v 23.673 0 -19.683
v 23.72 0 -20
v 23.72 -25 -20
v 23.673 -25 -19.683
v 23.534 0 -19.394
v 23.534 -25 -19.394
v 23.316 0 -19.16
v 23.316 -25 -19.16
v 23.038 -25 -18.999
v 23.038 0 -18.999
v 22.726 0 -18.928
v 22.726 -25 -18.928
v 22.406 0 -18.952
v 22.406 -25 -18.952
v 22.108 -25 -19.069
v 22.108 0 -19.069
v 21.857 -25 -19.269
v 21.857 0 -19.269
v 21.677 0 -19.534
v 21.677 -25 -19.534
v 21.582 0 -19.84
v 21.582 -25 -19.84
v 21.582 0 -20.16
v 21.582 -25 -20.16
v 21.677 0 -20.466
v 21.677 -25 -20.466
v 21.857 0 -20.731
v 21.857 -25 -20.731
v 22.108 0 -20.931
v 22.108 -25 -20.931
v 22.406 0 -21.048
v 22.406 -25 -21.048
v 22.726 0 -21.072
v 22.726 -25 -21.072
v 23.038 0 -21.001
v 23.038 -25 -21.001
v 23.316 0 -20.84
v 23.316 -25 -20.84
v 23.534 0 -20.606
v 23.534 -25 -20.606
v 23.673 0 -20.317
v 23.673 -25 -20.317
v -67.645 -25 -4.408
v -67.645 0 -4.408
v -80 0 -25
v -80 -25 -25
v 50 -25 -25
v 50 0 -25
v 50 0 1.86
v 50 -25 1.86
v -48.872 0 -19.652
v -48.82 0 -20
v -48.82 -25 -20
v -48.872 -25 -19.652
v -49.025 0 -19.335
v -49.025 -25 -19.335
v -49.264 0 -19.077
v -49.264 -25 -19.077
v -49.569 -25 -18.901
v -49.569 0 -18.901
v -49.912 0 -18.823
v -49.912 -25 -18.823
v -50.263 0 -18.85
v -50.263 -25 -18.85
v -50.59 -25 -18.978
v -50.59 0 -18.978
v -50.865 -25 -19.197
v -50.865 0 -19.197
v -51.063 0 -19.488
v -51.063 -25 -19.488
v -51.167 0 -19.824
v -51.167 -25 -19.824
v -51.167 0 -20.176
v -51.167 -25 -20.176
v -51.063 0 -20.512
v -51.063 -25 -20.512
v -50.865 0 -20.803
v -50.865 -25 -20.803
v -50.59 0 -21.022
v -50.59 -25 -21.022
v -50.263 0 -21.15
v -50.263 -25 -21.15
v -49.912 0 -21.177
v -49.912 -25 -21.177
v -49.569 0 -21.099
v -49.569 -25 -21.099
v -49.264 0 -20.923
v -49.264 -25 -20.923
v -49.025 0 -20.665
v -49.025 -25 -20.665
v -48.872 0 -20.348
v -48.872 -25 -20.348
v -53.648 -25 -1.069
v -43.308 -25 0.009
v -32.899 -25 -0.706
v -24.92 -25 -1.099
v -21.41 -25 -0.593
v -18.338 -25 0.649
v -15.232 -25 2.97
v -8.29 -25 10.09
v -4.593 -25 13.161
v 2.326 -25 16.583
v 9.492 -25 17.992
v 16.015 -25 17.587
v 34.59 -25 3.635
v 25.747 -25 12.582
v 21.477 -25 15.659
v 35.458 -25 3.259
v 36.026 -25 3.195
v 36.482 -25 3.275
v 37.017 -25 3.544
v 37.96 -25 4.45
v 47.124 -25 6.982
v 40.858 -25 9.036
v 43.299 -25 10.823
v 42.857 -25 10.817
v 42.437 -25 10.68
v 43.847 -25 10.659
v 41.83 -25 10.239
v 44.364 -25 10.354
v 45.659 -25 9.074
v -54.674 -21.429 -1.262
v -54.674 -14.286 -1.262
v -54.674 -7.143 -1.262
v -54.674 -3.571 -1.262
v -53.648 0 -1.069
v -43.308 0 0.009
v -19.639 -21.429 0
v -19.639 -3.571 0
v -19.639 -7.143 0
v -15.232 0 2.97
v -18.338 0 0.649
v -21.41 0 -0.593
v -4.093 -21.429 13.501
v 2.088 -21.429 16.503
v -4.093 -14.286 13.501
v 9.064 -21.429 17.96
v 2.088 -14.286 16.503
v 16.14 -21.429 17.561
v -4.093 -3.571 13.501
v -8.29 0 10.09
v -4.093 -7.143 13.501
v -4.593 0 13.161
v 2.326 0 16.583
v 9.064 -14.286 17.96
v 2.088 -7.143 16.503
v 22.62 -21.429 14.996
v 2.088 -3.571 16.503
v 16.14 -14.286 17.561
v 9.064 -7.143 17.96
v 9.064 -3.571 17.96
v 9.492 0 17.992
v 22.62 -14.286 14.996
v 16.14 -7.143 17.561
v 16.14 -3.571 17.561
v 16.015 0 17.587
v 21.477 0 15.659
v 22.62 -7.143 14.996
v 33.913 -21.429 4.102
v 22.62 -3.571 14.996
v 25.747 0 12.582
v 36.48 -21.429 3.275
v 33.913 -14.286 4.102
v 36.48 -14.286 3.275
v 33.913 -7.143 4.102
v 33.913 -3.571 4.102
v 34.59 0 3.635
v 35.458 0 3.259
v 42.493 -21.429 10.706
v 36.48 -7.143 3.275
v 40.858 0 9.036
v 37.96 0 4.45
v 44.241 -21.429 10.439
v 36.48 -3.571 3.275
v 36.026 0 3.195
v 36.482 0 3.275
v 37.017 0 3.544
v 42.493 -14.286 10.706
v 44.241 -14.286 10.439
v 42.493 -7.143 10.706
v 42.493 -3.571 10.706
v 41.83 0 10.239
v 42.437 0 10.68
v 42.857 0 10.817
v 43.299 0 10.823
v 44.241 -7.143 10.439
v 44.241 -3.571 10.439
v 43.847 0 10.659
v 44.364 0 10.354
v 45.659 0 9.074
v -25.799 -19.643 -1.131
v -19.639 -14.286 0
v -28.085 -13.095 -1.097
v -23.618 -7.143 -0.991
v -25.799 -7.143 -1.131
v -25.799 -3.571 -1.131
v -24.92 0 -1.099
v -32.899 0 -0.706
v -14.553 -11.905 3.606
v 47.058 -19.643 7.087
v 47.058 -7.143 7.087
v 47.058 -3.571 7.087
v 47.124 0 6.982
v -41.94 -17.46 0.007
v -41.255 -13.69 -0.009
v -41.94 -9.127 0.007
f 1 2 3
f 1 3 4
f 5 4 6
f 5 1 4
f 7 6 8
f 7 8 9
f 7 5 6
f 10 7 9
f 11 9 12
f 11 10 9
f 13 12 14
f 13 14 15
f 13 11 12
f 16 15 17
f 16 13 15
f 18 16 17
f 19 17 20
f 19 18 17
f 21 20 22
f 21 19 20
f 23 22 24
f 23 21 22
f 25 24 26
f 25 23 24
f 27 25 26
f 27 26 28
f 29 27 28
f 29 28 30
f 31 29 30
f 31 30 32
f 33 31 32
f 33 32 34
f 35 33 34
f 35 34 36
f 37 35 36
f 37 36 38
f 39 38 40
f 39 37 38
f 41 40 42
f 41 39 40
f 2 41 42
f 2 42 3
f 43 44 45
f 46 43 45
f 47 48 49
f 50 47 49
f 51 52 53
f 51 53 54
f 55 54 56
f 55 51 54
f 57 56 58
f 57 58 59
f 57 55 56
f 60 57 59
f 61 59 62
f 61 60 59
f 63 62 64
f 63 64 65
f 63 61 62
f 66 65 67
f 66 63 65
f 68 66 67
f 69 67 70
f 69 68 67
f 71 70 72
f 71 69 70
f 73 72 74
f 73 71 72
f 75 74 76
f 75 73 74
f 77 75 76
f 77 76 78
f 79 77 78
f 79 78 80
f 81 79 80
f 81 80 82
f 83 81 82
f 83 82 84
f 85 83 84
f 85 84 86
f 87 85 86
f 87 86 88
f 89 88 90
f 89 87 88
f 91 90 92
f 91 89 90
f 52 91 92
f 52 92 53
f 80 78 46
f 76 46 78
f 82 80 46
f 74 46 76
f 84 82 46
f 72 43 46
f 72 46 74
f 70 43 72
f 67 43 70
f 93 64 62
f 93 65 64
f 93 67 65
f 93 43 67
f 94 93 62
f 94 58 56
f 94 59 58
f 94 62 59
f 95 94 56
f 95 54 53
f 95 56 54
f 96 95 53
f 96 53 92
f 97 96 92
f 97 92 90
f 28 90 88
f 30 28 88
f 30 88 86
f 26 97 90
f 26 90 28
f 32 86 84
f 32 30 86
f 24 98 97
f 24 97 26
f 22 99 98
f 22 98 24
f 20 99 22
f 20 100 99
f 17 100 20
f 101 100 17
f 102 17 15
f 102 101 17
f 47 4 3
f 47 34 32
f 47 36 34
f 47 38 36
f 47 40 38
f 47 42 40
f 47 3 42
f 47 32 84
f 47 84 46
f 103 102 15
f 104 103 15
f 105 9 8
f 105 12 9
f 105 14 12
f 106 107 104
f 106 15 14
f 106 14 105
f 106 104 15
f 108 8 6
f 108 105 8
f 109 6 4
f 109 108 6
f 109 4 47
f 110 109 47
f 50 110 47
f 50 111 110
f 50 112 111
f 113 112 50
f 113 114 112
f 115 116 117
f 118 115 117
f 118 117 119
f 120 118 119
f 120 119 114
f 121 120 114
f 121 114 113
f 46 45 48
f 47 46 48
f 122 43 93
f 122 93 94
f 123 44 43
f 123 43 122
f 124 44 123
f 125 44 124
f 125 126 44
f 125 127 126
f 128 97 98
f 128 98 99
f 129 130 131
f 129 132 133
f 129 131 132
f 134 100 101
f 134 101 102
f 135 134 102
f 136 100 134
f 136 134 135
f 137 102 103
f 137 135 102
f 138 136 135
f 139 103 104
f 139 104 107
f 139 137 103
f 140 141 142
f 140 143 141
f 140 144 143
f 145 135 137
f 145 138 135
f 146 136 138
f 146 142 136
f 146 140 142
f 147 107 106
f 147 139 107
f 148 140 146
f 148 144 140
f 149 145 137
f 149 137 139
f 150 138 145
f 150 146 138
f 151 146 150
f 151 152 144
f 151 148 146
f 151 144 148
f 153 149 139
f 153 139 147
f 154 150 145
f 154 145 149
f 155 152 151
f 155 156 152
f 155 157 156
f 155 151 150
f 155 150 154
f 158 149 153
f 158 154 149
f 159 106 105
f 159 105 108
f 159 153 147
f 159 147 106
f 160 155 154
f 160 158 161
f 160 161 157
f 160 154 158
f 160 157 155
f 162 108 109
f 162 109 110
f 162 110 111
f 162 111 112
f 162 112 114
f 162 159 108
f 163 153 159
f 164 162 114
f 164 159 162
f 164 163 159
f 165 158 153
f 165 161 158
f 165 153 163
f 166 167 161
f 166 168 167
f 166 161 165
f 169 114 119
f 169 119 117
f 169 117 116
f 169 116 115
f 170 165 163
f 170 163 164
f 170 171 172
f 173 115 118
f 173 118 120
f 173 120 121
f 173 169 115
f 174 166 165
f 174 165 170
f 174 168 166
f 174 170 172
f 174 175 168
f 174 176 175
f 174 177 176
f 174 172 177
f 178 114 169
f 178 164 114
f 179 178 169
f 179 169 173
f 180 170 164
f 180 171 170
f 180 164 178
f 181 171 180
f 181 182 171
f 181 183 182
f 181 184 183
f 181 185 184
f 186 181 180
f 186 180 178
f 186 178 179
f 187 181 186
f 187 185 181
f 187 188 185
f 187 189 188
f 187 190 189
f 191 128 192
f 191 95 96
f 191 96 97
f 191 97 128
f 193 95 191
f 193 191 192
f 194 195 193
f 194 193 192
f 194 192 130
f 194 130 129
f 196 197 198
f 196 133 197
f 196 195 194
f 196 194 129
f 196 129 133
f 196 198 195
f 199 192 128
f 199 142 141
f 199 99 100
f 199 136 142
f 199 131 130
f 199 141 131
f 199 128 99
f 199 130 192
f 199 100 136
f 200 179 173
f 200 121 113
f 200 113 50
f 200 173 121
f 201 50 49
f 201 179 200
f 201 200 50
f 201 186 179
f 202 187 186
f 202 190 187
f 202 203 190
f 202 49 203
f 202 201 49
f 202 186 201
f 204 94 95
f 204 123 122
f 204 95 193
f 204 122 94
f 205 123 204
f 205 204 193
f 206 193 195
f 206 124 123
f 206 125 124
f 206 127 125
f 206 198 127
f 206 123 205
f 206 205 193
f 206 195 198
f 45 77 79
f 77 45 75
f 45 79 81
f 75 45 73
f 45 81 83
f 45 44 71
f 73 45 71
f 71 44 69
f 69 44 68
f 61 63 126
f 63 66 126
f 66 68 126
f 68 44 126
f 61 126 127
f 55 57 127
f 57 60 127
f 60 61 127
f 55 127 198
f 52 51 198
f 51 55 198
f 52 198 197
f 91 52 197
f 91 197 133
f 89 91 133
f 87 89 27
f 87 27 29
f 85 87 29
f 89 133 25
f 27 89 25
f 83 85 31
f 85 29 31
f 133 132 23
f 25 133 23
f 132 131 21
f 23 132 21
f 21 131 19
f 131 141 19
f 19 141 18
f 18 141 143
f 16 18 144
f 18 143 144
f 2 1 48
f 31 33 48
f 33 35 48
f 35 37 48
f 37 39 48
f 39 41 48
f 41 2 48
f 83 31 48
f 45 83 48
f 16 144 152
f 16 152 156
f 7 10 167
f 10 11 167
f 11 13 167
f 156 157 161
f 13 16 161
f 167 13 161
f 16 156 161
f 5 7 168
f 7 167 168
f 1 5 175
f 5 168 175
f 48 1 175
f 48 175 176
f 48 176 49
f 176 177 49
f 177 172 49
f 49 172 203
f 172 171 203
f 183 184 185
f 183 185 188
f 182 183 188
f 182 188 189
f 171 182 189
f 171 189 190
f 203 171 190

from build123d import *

# Parameters (mm, degrees)
F0_R     = 1.180077203
F0_R_2   = 1.075
F1_DEPTH = 25
F2_DEPTH = 25
F3_DEPTH = 156


# Not quite as in the source:
# - an extrude ends at something that could not be found from the text; its depth is read off the source's solid


with BuildPart() as f1:
    # F0 (on Front) → F1 (new body)
    with BuildSketch(Plane.XZ):
        with BuildLine():
            Line((-80, -25), (-50, -25))
            Line((-50, -25), (22.6452976465, -25))
            Line((22.6452976465, -25), (50, -25))
            Line((50, -25), (50, 1.8597864546))
            add(Edge.make_bspline(
                [(-67.6445906489, -4.4076510815), (-59.0102886259, -2.1011168124), (-42.5071210423, 2.3074759699), (-17.5616744307, -4.6627715865), (-6.6736378345, 16.9872606787), (24.059206598, 21.3213776549), (36.3958726575, -3.9761585615), (42.342577975, 16.1775178738), (47.3665093795, 6.7838472254), (50, 1.8597864546)],
                knots=[0, 0, 0, 0, 0.1696918572, 0.3243404215, 0.4741260658, 0.6448671709, 0.7855029125, 0.8875629417, 1, 1, 1, 1], degree=3))
            Line((-67.6445906489, -4.4076510815), (-80, -25))
        make_face()
        with Locations((-50, -20)):
            Circle(F0_R, mode=Mode.SUBTRACT)
        with Locations((22.6452976465, -20)):
            Circle(F0_R_2, mode=Mode.SUBTRACT)
    extrude(amount=F1_DEPTH)

    # F0 (on Front) → F2 (join)
    with BuildSketch(Plane.XZ):
        with BuildLine():
            Line((-80, -25), (-50, -25))
            Line((-50, -25), (22.6452976465, -25))
            Line((22.6452976465, -25), (50, -25))
            Line((50, -25), (50, 1.8597864546))
            add(Edge.make_bspline(
                [(-67.6445906489, -4.4076510815), (-59.0102886259, -2.1011168124), (-42.5071210423, 2.3074759699), (-17.5616744307, -4.6627715865), (-6.6736378345, 16.9872606787), (24.059206598, 21.3213776549), (36.3958726575, -3.9761585615), (42.342577975, 16.1775178738), (47.3665093795, 6.7838472254), (50, 1.8597864546)],
                knots=[0, 0, 0, 0, 0.1696918572, 0.3243404215, 0.4741260658, 0.6448671709, 0.7855029125, 0.8875629417, 1, 1, 1, 1], degree=3))
            Line((-67.6445906489, -4.4076510815), (-80, -25))
        make_face()
        with Locations((-50, -20)):
            Circle(F0_R, mode=Mode.SUBTRACT)
        with Locations((22.6452976465, -20)):
            Circle(F0_R_2, mode=Mode.SUBTRACT)
    extrude(amount=F2_DEPTH)

    # F0 (on Front) → F3 (cut, through all)
    with BuildSketch(Plane.XZ):
        with BuildLine():
            Line((-50, 25), (-67.6445906489, -4.4076510815))
            add(Edge.make_bspline(
                [(-67.6445906489, -4.4076510815), (-59.0102886259, -2.1011168124), (-42.5071210423, 2.3074759699), (-17.5616744307, -4.6627715865), (-6.6736378345, 16.9872606787), (24.059206598, 21.3213776549), (36.3958726575, -3.9761585615), (42.342577975, 16.1775178738), (47.3665093795, 6.7838472254), (50, 1.8597864546)],
                knots=[0, 0, 0, 0, 0.1696918572, 0.3243404215, 0.4741260658, 0.6448671709, 0.7855029125, 0.8875629417, 1, 1, 1, 1], degree=3))
            Line((50, 1.8597864546), (50, 25))
            Line((50, 25), (-50, 25))
        make_face()
    extrude(amount=-F3_DEPTH, mode=Mode.SUBTRACT)


solid = f1.part
